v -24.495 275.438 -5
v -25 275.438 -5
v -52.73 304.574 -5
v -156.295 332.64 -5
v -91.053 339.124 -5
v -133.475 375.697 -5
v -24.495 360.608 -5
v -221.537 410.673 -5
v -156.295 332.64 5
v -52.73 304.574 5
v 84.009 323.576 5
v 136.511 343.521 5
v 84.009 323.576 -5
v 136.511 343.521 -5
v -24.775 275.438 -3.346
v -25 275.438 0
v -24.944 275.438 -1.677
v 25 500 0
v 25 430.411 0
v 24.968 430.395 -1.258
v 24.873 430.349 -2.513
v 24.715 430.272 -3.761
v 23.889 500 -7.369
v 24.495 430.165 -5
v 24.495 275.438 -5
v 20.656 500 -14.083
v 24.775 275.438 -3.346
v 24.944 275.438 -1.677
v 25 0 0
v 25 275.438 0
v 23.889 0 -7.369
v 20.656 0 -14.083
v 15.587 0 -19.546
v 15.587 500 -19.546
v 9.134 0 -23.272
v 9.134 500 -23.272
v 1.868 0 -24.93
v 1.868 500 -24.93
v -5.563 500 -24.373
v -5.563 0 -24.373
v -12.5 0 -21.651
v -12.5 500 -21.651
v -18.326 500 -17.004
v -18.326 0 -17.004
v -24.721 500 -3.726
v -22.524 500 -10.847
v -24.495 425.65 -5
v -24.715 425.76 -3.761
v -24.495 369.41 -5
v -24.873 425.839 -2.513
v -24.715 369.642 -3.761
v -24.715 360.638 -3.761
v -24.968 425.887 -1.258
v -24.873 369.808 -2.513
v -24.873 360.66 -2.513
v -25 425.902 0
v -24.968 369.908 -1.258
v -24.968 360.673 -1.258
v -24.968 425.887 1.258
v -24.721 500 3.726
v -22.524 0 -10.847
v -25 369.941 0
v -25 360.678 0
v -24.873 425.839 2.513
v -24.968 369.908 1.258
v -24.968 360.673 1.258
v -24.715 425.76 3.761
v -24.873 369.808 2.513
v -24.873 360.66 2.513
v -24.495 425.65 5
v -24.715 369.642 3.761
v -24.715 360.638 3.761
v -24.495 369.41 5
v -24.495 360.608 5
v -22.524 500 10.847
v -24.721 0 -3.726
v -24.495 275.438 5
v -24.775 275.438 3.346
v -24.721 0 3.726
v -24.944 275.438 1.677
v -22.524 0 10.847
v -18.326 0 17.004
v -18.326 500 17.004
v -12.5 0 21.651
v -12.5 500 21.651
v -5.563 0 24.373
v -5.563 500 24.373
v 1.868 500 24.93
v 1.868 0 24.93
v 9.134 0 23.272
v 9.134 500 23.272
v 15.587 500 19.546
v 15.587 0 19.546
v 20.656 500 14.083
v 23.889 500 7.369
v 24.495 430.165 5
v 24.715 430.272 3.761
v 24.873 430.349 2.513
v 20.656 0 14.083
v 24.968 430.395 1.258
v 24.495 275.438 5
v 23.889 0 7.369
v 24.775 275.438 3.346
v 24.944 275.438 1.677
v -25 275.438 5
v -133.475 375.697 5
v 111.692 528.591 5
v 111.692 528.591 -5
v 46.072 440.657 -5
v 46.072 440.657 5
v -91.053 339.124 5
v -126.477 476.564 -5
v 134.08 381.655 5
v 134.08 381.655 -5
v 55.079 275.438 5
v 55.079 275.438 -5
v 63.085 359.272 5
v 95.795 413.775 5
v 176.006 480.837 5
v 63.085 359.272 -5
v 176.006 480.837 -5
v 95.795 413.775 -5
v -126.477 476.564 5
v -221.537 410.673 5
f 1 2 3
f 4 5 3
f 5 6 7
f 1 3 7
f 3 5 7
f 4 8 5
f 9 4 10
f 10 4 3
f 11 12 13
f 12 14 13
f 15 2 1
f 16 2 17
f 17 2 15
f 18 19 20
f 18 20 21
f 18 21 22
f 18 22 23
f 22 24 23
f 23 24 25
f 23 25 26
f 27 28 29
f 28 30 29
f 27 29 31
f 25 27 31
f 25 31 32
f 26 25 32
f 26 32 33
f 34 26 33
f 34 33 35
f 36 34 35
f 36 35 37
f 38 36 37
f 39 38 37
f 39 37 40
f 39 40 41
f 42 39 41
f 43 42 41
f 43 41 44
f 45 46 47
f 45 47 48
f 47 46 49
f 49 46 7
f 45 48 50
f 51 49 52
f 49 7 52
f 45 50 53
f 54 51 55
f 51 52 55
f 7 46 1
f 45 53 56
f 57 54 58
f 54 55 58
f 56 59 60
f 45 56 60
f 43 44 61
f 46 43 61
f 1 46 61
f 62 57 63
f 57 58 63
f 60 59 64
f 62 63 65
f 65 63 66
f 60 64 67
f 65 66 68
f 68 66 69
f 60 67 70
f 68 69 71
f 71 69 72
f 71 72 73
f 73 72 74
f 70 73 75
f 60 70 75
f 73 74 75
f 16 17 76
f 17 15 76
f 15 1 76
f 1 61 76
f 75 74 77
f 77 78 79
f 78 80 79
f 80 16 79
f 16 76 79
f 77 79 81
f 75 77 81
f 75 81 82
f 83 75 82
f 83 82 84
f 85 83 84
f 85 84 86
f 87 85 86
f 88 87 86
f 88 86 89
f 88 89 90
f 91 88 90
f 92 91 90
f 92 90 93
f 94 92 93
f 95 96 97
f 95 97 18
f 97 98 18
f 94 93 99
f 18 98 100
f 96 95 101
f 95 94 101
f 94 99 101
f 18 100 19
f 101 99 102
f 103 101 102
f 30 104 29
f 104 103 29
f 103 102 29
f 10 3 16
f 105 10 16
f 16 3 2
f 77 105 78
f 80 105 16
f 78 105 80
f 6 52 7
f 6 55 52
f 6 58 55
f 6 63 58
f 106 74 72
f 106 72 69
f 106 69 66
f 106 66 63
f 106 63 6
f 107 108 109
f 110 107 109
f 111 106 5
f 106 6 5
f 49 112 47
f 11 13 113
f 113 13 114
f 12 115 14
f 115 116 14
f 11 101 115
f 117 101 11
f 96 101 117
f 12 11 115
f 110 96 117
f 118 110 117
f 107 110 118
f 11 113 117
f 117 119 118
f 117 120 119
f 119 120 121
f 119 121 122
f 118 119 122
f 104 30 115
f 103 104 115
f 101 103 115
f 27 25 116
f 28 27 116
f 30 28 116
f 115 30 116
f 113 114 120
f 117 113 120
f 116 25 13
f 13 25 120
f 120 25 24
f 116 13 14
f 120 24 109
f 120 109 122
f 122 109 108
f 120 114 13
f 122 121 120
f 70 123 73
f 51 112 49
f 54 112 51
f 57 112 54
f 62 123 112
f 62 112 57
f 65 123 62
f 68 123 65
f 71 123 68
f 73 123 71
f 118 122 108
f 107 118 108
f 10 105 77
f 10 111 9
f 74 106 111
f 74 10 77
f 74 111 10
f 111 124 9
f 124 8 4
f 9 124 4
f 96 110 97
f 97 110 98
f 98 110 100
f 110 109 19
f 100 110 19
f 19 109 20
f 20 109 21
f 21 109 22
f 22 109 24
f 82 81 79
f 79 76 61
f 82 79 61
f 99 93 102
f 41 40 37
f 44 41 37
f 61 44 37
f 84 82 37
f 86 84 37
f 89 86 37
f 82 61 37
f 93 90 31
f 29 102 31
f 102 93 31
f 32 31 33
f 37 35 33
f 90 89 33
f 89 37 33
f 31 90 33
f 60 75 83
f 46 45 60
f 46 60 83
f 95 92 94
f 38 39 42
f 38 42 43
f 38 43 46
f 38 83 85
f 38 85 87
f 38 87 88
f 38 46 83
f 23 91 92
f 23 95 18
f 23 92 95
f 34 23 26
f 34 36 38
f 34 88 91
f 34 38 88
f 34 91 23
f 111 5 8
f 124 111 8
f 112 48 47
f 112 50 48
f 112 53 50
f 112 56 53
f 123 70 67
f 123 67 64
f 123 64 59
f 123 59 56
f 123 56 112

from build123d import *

# Parameters (mm, degrees)
SKETCH_1_R           = 25
EXTRUDE_1_DEPTH      = 500
EXTRUDE_2_DEPTH      = 5
EXTRUDE_2_DEPTH_BACK = 5


with BuildPart() as part:
    # 草图1 → 凸台-拉伸1 (new body)
    with BuildSketch(Plane(origin=(0, 0, 0), x_dir=(1, 0, 0), z_dir=(0, 1, 0))):
        Circle(SKETCH_1_R)
    extrude(amount=EXTRUDE_1_DEPTH)

    # 草图2 → 凸台-拉伸2 (add, two sides: drawn at the far end of the back side and taken through both)
    with BuildSketch(Plane.XY.offset(-EXTRUDE_2_DEPTH_BACK)):
        Polygon((-4.904147501, 415.869728805), (-126.476794097, 476.563858447), (-14.845338431, 359.271534235), (-133.474875453, 375.696686665), (-91.053404274, 339.123990271), (-221.536557101, 410.673201002), (-156.294980688, 332.640319032), (-52.729774464, 304.574199064), (-25, 275.438238439), (55.079469547, 275.438238439), (136.510624595, 343.521036234), (84.009054298, 323.576399455), (134.080402497, 381.655252369), (63.084510335, 359.271534235), (176.005774191, 480.837199539), (95.795047071, 413.774774694), (111.692244322, 528.591191642), (46.07245174, 440.657183354), align=None)
    extrude(amount=EXTRUDE_2_DEPTH + EXTRUDE_2_DEPTH_BACK)


solid = part.part
